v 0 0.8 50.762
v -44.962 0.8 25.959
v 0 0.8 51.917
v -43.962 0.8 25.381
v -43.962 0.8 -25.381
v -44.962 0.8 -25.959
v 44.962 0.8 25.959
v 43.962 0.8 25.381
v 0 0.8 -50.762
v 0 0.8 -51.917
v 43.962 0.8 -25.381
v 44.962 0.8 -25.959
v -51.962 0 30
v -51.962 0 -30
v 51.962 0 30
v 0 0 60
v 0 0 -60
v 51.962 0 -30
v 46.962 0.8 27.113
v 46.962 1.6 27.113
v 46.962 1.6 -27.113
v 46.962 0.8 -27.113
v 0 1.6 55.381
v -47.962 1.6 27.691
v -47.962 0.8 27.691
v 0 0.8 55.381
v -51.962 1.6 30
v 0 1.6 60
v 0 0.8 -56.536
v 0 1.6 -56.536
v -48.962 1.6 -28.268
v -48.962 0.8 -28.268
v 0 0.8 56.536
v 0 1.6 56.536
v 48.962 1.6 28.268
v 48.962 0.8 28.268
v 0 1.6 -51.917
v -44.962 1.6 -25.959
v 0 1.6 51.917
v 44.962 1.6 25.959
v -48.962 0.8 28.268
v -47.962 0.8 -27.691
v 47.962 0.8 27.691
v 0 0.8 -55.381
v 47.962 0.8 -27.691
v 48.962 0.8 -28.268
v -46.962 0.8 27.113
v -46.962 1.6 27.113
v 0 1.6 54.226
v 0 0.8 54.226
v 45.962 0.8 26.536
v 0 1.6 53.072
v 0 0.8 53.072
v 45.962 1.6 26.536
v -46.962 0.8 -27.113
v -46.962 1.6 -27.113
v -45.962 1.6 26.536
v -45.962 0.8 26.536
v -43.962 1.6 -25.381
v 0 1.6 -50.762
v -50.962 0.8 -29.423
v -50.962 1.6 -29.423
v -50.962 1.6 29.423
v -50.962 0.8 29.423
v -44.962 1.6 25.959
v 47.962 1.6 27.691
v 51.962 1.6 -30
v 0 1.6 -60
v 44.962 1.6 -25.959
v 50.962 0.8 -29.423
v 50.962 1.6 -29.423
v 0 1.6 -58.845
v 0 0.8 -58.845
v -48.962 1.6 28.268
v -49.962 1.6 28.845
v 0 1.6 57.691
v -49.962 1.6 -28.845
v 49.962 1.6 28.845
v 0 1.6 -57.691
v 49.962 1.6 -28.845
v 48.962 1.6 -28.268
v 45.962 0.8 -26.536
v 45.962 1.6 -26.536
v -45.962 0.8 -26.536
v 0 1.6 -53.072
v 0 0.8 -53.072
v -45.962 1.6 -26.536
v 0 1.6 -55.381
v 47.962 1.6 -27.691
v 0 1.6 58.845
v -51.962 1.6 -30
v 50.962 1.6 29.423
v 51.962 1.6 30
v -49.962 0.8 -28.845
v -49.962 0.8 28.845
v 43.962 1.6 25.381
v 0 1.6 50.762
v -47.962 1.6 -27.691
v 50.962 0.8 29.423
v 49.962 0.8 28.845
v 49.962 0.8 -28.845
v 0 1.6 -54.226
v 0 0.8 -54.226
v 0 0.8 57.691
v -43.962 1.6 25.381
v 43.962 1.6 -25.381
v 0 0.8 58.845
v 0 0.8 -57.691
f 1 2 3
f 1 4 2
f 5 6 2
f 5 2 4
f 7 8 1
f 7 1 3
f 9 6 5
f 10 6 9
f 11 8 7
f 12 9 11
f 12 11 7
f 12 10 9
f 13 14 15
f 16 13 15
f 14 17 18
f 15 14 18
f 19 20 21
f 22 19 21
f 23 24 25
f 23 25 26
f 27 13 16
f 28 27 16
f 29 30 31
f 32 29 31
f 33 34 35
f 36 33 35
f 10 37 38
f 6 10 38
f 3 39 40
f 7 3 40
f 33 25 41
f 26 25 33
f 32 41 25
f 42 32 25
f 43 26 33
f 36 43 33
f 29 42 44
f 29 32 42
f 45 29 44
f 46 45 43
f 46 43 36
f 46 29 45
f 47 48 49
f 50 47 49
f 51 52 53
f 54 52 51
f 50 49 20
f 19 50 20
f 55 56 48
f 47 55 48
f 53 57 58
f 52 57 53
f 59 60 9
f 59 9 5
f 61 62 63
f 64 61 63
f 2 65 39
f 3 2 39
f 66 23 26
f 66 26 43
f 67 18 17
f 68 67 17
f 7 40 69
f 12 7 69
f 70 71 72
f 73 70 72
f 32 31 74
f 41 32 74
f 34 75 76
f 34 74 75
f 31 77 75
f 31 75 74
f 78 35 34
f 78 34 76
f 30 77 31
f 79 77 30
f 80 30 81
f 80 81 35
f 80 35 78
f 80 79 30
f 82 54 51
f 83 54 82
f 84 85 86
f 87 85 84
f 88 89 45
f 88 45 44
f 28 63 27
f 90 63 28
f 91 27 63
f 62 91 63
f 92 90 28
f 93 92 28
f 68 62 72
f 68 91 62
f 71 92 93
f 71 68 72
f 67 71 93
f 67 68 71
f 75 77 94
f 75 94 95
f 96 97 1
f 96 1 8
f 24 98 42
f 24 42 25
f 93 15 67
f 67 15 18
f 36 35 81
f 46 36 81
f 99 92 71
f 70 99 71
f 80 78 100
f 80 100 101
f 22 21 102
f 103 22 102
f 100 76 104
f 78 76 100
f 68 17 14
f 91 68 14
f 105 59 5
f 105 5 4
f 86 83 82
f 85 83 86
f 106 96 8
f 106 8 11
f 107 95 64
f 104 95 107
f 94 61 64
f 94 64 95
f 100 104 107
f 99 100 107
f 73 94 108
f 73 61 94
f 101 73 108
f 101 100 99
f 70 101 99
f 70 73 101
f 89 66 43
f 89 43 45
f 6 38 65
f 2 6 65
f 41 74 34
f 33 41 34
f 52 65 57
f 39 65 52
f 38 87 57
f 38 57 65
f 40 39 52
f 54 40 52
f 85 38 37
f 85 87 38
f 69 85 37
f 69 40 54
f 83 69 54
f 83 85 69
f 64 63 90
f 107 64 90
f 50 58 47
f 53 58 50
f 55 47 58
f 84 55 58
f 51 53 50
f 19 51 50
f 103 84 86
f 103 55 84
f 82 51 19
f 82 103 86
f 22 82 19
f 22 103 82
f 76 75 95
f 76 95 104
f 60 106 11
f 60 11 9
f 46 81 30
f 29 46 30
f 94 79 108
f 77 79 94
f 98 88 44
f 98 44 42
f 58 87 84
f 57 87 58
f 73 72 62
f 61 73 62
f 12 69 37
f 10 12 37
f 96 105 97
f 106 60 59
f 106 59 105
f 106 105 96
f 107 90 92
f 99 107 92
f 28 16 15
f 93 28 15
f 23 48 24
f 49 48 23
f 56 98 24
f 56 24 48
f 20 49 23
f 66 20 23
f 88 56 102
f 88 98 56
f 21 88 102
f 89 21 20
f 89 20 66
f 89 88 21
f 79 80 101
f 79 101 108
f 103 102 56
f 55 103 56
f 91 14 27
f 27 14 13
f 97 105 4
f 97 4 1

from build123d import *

# Parameters (mm, degrees)
BOSS_EXTRUDE1_DEPTH = 1.6
CUT_EXTRUDE1_DEPTH  = 0.8


with BuildPart() as part:
    # Sketch1 → Boss-Extrude1 (new body)
    with BuildSketch(Plane(origin=(0, 0, 0), x_dir=(1, 0, 0), z_dir=(0, 1, 0))):
        Polygon((0, -60), (51.961524227, -30), (51.961524227, 30), (0, 60), (-51.961524227, 30), (-51.961524227, -30), align=None)
    extrude(amount=BOSS_EXTRUDE1_DEPTH)

    # Sketch2 → Cut-Extrude1 (cut)
    # profile 1 of 4: a face of its own
    with BuildSketch(Plane(origin=(0, 1.6, 0), x_dir=(1, 0, 0), z_dir=(0, 1, 0))):
        Polygon((0, 58.845299462), (-50.961524227, 29.422649731), (-50.961524227, -29.422649731), (0, -58.845299462), (50.961524227, -29.422649731), (50.961524227, 29.422649731), align=None)
        Polygon((-49.961524227, 28.845299462), (-49.961524227, -28.845299462), (0, -57.690598923), (49.961524227, -28.845299462), (49.961524227, 28.845299462), (0, 57.690598923), align=None, mode=Mode.SUBTRACT)
    # profile 2 of 4: a face of its own
    with BuildSketch(Plane(origin=(0, 1.6, 0), x_dir=(1, 0, 0), z_dir=(0, 1, 0))):
        Polygon((0, 56.535898385), (-48.961524227, 28.267949192), (-48.961524227, -28.267949192), (0, -56.535898385), (48.961524227, -28.267949192), (48.961524227, 28.267949192), align=None)
        Polygon((-47.961524227, 27.690598923), (-47.961524227, -27.690598923), (0, -55.381197846), (47.961524227, -27.690598923), (47.961524227, 27.690598923), (0, 55.381197846), align=None, mode=Mode.SUBTRACT)
    # profile 3 of 4: a face of its own
    with BuildSketch(Plane(origin=(0, 1.6, 0), x_dir=(1, 0, 0), z_dir=(0, 1, 0))):
        Polygon((0, 54.226497308), (-46.961524227, 27.113248654), (-46.961524227, -27.113248654), (0, -54.226497308), (46.961524227, -27.113248654), (46.961524227, 27.113248654), align=None)
        Polygon((-45.961524227, 26.535898385), (-45.961524227, -26.535898385), (0, -53.07179677), (45.961524227, -26.535898385), (45.961524227, 26.535898385), (0, 53.07179677), align=None, mode=Mode.SUBTRACT)
    # profile 4 of 4: a face of its own
    with BuildSketch(Plane(origin=(0, 1.6, 0), x_dir=(1, 0, 0), z_dir=(0, 1, 0))):
        Polygon((0, 51.917096231), (-44.961524227, 25.958548116), (-44.961524227, -25.958548116), (0, -51.917096231), (44.961524227, -25.958548116), (44.961524227, 25.958548116), align=None)
        Polygon((-43.961524227, 25.381197846), (-43.961524227, -25.381197846), (0, -50.762395693), (43.961524227, -25.381197846), (43.961524227, 25.381197846), (0, 50.762395693), align=None, mode=Mode.SUBTRACT)
    extrude(amount=-CUT_EXTRUDE1_DEPTH, mode=Mode.SUBTRACT)


solid = part.part
